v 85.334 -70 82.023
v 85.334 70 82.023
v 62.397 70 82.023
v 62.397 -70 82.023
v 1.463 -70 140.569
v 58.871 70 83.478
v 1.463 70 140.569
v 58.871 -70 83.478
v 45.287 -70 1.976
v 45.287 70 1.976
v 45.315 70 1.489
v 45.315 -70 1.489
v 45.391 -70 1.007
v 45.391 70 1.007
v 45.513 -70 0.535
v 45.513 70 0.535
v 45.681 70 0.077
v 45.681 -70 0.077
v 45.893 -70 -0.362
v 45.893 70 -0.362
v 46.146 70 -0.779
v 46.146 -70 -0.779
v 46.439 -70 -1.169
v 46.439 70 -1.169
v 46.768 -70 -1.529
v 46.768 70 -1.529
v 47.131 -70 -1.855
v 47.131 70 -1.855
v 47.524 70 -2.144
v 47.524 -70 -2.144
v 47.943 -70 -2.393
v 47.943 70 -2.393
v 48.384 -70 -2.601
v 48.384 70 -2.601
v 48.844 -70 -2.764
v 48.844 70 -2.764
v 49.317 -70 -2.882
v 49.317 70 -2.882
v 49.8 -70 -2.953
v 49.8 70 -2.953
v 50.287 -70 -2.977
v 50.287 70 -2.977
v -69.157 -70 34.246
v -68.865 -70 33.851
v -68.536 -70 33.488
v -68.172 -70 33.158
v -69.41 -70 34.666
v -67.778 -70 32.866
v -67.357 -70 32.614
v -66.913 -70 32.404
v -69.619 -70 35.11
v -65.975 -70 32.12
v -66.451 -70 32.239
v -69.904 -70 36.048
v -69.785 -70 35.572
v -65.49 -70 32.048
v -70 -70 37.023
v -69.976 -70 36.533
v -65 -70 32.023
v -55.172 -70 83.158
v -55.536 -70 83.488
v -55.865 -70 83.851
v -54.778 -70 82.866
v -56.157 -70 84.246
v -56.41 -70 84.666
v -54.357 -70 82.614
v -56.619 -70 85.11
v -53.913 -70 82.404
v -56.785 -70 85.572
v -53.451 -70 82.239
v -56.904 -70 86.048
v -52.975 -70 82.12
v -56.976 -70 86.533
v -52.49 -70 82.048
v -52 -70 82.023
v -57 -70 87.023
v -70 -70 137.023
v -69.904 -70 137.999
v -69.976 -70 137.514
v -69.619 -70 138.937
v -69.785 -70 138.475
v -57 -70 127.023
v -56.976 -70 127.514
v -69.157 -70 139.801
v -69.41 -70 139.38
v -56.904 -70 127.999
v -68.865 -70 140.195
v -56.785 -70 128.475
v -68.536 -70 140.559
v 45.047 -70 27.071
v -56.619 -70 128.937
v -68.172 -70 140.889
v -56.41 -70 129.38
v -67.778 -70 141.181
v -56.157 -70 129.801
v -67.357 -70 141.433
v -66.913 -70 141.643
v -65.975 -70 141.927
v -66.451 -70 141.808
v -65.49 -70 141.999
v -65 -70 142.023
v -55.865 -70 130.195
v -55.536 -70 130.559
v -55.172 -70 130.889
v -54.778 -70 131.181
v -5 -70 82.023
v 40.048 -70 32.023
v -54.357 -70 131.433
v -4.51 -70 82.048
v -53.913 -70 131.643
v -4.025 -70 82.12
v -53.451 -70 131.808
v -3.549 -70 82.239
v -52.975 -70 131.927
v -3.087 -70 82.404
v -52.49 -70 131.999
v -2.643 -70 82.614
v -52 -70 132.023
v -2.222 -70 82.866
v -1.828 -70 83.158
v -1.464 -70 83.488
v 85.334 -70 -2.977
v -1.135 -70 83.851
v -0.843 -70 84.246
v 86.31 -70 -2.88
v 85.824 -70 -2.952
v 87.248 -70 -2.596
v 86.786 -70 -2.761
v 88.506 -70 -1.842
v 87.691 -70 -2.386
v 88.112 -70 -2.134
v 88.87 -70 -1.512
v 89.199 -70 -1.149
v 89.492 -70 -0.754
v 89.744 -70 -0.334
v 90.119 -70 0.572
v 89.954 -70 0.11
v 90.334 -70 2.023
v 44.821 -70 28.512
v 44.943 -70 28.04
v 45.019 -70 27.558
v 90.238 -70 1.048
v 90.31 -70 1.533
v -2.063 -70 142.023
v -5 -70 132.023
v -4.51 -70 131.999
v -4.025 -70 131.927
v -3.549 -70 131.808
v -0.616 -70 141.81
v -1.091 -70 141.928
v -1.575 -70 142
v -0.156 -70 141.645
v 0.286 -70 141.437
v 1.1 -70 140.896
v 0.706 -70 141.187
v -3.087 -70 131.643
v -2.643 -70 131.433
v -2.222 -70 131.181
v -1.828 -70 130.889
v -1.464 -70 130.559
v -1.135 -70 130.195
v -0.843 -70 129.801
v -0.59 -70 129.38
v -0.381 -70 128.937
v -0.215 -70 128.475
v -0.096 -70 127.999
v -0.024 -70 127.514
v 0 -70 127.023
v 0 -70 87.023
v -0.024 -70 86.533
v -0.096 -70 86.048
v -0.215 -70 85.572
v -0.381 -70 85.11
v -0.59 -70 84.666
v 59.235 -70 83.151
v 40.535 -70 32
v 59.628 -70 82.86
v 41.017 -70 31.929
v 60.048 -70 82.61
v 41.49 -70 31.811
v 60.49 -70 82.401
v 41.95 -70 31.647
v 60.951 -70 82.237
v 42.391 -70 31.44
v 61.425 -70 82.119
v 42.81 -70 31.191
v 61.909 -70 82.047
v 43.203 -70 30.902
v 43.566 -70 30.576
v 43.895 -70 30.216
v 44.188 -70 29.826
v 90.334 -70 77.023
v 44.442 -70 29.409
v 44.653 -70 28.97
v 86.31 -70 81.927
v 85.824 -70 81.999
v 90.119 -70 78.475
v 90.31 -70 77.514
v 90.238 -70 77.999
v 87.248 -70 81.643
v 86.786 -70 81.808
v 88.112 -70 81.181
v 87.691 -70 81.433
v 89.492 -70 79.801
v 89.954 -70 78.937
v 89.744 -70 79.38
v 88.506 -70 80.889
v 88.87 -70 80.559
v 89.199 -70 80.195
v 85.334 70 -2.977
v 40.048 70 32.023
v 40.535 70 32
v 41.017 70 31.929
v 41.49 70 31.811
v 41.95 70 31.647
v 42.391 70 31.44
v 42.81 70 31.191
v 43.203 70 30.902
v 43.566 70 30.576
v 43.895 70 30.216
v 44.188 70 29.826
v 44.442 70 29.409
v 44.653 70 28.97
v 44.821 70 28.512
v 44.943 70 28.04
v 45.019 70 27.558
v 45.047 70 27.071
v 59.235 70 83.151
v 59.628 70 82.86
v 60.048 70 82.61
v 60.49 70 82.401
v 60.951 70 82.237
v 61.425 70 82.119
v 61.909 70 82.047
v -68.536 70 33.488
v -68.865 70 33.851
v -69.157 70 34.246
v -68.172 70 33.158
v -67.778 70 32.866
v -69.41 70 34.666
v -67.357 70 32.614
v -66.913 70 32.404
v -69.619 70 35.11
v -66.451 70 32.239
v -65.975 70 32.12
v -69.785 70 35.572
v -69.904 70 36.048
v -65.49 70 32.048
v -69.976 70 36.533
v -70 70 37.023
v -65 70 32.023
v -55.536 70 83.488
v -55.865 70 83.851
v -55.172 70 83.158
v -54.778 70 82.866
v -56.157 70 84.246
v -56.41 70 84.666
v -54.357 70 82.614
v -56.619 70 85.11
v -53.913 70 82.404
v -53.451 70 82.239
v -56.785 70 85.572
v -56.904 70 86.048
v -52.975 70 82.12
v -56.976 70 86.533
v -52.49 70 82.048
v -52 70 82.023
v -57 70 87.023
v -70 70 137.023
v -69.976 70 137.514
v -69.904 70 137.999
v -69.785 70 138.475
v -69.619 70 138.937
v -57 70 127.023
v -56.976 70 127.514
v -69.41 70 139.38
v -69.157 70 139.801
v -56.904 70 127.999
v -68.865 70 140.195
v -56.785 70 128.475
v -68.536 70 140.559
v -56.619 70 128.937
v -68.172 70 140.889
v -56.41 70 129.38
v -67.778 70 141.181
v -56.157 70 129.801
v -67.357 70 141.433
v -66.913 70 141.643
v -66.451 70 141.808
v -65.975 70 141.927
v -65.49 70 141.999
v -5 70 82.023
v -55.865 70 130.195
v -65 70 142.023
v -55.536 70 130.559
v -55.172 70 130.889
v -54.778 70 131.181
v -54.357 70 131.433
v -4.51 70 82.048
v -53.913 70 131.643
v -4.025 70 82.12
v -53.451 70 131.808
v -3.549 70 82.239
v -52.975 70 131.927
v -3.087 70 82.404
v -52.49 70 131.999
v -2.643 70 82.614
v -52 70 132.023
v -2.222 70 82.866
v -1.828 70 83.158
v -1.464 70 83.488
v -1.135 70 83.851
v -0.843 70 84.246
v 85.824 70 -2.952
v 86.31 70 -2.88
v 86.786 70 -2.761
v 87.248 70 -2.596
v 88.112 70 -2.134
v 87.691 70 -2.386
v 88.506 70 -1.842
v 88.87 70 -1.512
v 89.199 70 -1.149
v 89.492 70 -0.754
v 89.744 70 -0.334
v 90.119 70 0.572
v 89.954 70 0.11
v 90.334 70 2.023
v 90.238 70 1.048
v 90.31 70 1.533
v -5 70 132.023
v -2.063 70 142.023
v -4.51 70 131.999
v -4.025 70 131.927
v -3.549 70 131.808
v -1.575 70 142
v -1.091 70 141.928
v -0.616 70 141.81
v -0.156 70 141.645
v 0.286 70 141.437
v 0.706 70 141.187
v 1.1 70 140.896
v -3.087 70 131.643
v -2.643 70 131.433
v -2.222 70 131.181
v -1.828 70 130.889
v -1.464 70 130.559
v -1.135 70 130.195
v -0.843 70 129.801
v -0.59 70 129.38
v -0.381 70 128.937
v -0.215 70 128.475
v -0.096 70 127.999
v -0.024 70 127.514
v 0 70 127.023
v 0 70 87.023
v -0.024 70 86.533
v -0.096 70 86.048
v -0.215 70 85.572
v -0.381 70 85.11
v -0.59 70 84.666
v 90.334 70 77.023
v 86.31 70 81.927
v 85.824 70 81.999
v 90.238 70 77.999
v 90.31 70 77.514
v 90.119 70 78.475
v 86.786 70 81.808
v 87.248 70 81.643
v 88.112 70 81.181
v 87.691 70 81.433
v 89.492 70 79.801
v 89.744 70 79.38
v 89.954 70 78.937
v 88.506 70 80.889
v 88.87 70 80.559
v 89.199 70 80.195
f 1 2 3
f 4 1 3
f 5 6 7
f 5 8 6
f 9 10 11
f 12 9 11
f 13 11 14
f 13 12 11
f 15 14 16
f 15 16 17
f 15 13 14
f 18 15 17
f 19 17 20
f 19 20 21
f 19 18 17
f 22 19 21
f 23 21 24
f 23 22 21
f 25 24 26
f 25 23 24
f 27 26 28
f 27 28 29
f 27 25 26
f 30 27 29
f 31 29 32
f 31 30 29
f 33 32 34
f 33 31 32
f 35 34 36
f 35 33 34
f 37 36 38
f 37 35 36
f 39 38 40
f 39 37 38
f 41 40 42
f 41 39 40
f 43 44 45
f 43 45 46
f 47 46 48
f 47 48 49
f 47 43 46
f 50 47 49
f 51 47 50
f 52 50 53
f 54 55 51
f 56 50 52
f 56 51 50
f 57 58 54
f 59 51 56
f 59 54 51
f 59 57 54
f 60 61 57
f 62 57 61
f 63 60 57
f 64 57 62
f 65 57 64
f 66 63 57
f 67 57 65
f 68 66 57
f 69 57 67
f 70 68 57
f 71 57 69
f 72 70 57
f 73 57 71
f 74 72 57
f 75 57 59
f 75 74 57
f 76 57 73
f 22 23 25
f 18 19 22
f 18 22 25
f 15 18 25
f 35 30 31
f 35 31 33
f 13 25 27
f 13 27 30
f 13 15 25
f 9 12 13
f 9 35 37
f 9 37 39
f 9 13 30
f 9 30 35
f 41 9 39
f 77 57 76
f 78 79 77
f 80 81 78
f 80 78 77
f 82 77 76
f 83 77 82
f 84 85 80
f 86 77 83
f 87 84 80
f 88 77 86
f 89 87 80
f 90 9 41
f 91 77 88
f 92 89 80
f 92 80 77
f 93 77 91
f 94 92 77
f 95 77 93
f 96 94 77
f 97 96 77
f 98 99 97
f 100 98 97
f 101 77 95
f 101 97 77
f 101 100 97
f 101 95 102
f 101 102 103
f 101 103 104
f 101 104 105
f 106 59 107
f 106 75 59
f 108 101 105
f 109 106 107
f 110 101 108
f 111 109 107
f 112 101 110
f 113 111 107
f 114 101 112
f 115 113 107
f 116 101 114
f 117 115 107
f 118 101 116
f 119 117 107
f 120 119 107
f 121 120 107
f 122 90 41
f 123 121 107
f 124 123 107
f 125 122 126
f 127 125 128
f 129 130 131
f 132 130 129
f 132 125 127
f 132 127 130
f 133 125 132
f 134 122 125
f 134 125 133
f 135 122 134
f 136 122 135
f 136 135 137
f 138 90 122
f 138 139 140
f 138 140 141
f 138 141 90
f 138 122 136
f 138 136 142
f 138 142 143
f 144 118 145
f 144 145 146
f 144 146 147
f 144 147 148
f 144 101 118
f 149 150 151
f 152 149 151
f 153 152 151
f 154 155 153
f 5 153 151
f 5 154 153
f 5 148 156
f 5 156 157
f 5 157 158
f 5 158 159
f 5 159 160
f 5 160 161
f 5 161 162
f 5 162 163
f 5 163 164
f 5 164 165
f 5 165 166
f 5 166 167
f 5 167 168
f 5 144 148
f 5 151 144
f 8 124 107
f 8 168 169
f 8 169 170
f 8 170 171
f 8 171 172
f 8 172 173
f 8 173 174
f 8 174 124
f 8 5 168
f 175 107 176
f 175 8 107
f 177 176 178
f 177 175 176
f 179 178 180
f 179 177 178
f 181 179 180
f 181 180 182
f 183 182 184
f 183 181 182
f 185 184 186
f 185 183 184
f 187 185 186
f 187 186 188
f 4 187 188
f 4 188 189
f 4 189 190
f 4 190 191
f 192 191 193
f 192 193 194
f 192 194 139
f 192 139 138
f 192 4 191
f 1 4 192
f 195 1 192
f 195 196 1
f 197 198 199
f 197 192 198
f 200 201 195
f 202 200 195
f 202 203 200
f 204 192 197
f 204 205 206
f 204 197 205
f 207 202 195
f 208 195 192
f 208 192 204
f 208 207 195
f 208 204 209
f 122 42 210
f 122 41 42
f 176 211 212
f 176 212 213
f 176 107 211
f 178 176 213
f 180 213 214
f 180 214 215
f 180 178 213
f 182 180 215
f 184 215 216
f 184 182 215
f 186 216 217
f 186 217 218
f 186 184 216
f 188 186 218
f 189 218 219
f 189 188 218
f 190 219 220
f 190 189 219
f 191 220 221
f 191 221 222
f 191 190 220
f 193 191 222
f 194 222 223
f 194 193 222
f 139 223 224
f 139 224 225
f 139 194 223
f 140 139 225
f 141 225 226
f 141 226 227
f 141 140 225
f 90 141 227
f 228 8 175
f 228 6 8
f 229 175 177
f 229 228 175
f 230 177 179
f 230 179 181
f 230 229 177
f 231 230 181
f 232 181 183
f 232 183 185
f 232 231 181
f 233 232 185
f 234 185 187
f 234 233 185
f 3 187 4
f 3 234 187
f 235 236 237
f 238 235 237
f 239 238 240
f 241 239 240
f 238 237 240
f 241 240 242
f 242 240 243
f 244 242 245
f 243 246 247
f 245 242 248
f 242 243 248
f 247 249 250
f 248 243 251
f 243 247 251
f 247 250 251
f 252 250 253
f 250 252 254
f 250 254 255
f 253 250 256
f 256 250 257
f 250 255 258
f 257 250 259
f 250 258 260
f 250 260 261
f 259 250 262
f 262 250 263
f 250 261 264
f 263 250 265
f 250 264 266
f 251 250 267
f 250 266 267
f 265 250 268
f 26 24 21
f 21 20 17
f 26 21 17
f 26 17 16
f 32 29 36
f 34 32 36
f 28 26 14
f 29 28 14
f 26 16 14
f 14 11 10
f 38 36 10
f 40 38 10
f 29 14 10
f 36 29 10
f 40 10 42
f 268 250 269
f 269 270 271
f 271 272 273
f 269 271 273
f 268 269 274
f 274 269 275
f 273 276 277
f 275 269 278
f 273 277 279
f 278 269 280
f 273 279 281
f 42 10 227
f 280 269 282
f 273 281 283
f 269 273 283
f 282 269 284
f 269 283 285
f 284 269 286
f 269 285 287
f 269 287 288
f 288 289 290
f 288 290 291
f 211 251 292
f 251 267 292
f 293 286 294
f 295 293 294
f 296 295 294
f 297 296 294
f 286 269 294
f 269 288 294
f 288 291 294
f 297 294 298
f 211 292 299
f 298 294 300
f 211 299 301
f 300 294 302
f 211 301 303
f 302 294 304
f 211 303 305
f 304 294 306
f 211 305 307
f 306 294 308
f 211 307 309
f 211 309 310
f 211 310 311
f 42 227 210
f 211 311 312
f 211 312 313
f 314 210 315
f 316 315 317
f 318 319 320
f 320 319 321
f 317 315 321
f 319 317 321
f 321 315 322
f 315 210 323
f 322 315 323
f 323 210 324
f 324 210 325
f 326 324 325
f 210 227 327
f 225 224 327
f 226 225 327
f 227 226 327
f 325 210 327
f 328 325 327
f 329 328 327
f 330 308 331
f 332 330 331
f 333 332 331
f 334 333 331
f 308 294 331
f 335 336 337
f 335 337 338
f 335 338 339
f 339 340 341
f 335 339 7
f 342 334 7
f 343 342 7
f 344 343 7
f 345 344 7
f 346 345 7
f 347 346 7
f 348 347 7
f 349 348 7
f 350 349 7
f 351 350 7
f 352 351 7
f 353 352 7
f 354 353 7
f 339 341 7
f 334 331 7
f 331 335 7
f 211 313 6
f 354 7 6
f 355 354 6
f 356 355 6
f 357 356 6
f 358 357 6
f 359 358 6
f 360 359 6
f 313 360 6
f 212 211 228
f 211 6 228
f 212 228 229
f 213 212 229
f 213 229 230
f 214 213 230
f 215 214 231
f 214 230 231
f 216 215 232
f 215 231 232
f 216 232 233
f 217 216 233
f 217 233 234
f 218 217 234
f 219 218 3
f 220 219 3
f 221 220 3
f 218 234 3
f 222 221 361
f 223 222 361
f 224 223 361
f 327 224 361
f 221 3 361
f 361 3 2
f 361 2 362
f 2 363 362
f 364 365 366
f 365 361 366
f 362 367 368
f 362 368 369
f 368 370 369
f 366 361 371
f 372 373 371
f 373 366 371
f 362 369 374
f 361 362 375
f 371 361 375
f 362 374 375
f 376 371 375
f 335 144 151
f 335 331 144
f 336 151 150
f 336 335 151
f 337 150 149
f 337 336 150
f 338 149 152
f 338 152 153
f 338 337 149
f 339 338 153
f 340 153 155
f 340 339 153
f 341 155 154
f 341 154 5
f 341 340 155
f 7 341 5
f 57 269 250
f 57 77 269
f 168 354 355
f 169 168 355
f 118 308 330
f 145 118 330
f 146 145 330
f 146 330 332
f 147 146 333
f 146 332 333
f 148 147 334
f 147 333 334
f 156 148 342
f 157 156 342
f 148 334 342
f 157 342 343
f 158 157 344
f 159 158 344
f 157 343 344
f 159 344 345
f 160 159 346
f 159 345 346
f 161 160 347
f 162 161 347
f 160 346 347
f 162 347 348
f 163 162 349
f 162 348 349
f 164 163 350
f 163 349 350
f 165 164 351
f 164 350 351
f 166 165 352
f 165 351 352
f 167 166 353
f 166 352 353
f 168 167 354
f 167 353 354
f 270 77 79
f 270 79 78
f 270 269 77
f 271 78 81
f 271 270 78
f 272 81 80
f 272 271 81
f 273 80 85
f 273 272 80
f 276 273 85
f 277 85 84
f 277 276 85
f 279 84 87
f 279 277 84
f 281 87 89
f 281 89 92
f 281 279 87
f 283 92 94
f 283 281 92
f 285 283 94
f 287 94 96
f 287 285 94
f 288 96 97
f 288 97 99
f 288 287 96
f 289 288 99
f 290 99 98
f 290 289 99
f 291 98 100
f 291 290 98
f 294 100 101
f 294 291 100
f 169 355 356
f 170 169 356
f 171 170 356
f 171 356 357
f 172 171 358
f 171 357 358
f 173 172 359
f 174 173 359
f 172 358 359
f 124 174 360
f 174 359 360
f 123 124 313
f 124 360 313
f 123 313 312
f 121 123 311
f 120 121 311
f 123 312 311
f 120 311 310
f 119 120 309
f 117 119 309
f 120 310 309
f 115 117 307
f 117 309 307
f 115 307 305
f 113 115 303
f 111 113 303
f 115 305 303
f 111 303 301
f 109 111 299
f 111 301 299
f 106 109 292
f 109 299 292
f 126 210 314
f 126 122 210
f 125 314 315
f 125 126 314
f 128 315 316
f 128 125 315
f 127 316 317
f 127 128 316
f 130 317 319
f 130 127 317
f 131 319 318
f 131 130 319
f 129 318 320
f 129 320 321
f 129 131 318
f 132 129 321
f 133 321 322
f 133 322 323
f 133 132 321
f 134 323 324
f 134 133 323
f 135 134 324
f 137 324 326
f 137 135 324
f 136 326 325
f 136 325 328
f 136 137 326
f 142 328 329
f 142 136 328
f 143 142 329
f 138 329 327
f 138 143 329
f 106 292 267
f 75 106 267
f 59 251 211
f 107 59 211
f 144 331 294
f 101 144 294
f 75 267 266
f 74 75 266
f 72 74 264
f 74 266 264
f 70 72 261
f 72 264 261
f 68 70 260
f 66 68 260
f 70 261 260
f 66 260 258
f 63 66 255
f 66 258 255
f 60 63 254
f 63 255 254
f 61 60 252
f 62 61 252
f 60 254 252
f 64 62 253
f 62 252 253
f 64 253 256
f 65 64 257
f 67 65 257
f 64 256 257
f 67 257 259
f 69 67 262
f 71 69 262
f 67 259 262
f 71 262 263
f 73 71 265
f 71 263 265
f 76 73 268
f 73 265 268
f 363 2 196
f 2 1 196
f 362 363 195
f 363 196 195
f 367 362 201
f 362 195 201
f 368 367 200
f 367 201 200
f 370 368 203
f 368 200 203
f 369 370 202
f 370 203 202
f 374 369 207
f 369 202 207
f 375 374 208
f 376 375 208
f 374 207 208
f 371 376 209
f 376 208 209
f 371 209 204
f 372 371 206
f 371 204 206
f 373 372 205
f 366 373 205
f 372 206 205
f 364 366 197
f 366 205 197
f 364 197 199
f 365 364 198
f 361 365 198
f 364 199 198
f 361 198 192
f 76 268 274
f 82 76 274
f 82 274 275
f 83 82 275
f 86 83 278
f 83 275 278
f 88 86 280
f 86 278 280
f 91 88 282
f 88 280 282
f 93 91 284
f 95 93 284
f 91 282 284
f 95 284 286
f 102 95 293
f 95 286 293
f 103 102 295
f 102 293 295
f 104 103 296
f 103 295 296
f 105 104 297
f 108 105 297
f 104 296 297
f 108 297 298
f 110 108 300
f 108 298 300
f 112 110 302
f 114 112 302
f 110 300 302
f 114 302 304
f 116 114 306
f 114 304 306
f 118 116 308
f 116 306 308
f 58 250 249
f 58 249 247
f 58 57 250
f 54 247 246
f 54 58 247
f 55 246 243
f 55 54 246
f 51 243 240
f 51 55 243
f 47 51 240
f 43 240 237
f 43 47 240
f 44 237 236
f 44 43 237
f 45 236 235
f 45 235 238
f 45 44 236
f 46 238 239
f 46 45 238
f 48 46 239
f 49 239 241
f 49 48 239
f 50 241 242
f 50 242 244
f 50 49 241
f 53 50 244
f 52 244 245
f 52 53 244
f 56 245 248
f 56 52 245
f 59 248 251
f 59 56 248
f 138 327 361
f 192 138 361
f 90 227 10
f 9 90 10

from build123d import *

# Parameters (mm, degrees)
F1_DEPTH = 70
F3_DEPTH = 140.001
F4_R     = 5


with BuildPart() as f1:
    # F0 (on Front) → F1 (new body, symmetric)
    with BuildSketch(Plane.XZ):
        Polygon((-70, 142.023449), (-70, 32.023449), (45, 32.023449), (45.334238, -2.976551), (90.334238, -2.976551), (90.334238, 82.023449), (60.334238, 82.023449), (0, 142.023449), align=None)
    extrude(amount=F1_DEPTH, both=True)

    # F2 (on face) → F3 (cut, through all)
    with BuildSketch(Plane(origin=(0, 70, 0), x_dir=(-1, 0, 0), z_dir=(0, 1, 0))):
        with BuildLine():
            Line((52, 132.023449), (5, 132.023449))
            ThreePointArc((5, 132.023449), (1.464466, 130.558983), (0, 127.023449))
            Line((0, 127.023449), (0, 87.023449))
            ThreePointArc((0, 87.023449), (1.464466, 83.487915), (5, 82.023449))
            Line((5, 82.023449), (52, 82.023449))
            ThreePointArc((52, 82.023449), (55.535534, 83.487915), (57, 87.023449))
            Line((57, 87.023449), (57, 127.023449))
            ThreePointArc((57, 127.023449), (55.535534, 130.558983), (52, 132.023449))
        make_face()
    extrude(amount=-F3_DEPTH, mode=Mode.SUBTRACT)

    # F4
    f4_edges = [f1.edges().sort_by_distance(p)[0] for p in [
        (0, 0, 142.023449),
        (60.334238, 0, 82.023449),
        (90.334238, 0, 82.023449),
        (90.334238, 0, -2.976551),
        (45.334238, 0, -2.976551),
        (45, 0, 32.023449),
        (-70, 0, 32.023449),
        (-70, 0, 142.023449),
    ]]
    fillet(f4_edges, radius=F4_R)


solid = f1.part
